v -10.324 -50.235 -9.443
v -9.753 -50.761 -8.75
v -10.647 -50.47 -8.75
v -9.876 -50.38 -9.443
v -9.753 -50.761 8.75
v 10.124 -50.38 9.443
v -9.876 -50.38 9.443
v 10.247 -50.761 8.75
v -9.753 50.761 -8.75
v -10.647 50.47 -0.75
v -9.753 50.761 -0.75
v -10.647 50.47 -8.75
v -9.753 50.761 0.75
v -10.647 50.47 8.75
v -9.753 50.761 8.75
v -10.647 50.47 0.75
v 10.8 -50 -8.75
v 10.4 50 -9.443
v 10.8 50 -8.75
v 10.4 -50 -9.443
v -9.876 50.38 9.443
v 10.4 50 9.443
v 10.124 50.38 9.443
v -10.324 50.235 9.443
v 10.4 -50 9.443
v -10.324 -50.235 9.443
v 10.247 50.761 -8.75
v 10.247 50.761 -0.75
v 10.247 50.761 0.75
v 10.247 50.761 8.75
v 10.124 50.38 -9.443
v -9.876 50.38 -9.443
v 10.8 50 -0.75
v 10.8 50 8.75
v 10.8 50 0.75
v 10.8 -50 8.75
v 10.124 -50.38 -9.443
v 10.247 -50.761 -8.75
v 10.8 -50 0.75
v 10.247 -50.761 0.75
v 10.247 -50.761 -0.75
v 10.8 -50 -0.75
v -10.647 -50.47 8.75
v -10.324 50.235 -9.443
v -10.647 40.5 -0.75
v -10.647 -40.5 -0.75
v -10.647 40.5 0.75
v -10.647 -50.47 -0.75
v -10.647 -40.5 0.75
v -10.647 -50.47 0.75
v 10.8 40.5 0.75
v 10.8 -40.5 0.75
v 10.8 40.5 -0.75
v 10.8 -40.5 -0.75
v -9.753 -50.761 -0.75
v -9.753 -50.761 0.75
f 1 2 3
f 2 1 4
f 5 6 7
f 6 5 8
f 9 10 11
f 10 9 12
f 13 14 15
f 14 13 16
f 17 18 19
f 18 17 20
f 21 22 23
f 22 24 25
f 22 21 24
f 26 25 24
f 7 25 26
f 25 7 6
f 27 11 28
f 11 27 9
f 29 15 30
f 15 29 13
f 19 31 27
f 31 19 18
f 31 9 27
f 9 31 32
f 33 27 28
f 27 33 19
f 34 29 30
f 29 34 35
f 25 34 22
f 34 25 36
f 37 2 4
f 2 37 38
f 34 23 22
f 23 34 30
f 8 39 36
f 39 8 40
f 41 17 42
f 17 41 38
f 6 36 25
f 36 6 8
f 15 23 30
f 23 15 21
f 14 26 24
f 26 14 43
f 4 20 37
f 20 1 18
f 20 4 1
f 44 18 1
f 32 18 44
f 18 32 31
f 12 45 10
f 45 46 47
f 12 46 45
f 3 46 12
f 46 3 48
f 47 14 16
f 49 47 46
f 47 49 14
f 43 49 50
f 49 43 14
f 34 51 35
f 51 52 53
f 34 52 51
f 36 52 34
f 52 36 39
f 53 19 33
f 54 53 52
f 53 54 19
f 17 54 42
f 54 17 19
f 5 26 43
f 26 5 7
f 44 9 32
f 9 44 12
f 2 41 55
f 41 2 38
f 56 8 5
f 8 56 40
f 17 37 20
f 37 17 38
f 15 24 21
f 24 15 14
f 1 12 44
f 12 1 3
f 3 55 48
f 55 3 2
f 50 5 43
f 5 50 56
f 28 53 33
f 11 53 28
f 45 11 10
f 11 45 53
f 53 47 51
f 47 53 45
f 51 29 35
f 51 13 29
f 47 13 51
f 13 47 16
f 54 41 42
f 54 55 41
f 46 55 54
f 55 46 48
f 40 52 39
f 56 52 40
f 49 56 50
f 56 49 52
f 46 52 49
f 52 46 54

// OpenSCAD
// Parameters
rail_length = 100.0; //[50.0:200.0:1]
rail_width = 20.0; //[10.0:40.0:0.5]
rail_height = 17.5; //[8.75:35.0:0.5]
overlap = 1.0; //[0.5:2.0:0.1]
chamfer_len = 1.5; //[0.75:3.0:0.1]
fillet_radius = 0.8; //[0.4:1.6:0.1]
hole_diameter = 0.0; //[0.0:6.0:0.1]
marking_depth = 0.0; //[0.0:1.0:0.05]

// Base Shapes
module rail_body() {
  translate([0, 0, 0])
    cube([rail_width, rail_length, rail_height], center=true);
}

module end_chamfer_wedge() {
  linear_extrude(height=chamfer_len, center=true)
    polygon(points=[
      [-rail_width/2 - overlap, -rail_height/2 - overlap],
      [rail_width/2 + overlap, -rail_height/2 - overlap],
      [rail_width/2 + overlap, rail_height/2 + overlap],
      [-rail_width/2 - overlap, rail_height/2 + overlap],
      [-rail_width/2 - overlap, -rail_height/2 - overlap]
    ]);
}

module fillet_sphere() {
  sphere(r=fillet_radius, center=true);
}

module mounting_hole_cyl() {
  rotate([90, 0, 0])
    cylinder(r=hole_diameter/2, h=rail_height + 2*overlap, center=true);
}

module engraved_markings_void() {
  translate([0, 0, rail_height/2 - marking_depth/2])
    cube([rail_width - 2*overlap, rail_length - 2*overlap, marking_depth], center=true);
}

// Operations
module edge_fillets() {
  minkowski() {
    rail_body();
    fillet_sphere();
  }
}

module end_chamfer_front_pos() {
  translate([0, rail_length/2 - chamfer_len/2 + overlap, 0])
    end_chamfer_wedge();
}

module end_chamfer_back_pos() {
  translate([0, -rail_length/2 + chamfer_len/2 - overlap, 0])
    end_chamfer_wedge();
}

module end_chamfers() {
  difference() {
    edge_fillets();
    end_chamfer_front_pos();
    end_chamfer_back_pos();
  }
}

module mounting_holes_pos() {
  translate([0, 0, 0])
    mounting_hole_cyl();
}

module mounting_holes() {
  difference() {
    end_chamfers();
    mounting_holes_pos();
  }
}

module engraved_markings() {
  difference() {
    mounting_holes();
    engraved_markings_void();
  }
}

// Final Output
engraved_markings();
